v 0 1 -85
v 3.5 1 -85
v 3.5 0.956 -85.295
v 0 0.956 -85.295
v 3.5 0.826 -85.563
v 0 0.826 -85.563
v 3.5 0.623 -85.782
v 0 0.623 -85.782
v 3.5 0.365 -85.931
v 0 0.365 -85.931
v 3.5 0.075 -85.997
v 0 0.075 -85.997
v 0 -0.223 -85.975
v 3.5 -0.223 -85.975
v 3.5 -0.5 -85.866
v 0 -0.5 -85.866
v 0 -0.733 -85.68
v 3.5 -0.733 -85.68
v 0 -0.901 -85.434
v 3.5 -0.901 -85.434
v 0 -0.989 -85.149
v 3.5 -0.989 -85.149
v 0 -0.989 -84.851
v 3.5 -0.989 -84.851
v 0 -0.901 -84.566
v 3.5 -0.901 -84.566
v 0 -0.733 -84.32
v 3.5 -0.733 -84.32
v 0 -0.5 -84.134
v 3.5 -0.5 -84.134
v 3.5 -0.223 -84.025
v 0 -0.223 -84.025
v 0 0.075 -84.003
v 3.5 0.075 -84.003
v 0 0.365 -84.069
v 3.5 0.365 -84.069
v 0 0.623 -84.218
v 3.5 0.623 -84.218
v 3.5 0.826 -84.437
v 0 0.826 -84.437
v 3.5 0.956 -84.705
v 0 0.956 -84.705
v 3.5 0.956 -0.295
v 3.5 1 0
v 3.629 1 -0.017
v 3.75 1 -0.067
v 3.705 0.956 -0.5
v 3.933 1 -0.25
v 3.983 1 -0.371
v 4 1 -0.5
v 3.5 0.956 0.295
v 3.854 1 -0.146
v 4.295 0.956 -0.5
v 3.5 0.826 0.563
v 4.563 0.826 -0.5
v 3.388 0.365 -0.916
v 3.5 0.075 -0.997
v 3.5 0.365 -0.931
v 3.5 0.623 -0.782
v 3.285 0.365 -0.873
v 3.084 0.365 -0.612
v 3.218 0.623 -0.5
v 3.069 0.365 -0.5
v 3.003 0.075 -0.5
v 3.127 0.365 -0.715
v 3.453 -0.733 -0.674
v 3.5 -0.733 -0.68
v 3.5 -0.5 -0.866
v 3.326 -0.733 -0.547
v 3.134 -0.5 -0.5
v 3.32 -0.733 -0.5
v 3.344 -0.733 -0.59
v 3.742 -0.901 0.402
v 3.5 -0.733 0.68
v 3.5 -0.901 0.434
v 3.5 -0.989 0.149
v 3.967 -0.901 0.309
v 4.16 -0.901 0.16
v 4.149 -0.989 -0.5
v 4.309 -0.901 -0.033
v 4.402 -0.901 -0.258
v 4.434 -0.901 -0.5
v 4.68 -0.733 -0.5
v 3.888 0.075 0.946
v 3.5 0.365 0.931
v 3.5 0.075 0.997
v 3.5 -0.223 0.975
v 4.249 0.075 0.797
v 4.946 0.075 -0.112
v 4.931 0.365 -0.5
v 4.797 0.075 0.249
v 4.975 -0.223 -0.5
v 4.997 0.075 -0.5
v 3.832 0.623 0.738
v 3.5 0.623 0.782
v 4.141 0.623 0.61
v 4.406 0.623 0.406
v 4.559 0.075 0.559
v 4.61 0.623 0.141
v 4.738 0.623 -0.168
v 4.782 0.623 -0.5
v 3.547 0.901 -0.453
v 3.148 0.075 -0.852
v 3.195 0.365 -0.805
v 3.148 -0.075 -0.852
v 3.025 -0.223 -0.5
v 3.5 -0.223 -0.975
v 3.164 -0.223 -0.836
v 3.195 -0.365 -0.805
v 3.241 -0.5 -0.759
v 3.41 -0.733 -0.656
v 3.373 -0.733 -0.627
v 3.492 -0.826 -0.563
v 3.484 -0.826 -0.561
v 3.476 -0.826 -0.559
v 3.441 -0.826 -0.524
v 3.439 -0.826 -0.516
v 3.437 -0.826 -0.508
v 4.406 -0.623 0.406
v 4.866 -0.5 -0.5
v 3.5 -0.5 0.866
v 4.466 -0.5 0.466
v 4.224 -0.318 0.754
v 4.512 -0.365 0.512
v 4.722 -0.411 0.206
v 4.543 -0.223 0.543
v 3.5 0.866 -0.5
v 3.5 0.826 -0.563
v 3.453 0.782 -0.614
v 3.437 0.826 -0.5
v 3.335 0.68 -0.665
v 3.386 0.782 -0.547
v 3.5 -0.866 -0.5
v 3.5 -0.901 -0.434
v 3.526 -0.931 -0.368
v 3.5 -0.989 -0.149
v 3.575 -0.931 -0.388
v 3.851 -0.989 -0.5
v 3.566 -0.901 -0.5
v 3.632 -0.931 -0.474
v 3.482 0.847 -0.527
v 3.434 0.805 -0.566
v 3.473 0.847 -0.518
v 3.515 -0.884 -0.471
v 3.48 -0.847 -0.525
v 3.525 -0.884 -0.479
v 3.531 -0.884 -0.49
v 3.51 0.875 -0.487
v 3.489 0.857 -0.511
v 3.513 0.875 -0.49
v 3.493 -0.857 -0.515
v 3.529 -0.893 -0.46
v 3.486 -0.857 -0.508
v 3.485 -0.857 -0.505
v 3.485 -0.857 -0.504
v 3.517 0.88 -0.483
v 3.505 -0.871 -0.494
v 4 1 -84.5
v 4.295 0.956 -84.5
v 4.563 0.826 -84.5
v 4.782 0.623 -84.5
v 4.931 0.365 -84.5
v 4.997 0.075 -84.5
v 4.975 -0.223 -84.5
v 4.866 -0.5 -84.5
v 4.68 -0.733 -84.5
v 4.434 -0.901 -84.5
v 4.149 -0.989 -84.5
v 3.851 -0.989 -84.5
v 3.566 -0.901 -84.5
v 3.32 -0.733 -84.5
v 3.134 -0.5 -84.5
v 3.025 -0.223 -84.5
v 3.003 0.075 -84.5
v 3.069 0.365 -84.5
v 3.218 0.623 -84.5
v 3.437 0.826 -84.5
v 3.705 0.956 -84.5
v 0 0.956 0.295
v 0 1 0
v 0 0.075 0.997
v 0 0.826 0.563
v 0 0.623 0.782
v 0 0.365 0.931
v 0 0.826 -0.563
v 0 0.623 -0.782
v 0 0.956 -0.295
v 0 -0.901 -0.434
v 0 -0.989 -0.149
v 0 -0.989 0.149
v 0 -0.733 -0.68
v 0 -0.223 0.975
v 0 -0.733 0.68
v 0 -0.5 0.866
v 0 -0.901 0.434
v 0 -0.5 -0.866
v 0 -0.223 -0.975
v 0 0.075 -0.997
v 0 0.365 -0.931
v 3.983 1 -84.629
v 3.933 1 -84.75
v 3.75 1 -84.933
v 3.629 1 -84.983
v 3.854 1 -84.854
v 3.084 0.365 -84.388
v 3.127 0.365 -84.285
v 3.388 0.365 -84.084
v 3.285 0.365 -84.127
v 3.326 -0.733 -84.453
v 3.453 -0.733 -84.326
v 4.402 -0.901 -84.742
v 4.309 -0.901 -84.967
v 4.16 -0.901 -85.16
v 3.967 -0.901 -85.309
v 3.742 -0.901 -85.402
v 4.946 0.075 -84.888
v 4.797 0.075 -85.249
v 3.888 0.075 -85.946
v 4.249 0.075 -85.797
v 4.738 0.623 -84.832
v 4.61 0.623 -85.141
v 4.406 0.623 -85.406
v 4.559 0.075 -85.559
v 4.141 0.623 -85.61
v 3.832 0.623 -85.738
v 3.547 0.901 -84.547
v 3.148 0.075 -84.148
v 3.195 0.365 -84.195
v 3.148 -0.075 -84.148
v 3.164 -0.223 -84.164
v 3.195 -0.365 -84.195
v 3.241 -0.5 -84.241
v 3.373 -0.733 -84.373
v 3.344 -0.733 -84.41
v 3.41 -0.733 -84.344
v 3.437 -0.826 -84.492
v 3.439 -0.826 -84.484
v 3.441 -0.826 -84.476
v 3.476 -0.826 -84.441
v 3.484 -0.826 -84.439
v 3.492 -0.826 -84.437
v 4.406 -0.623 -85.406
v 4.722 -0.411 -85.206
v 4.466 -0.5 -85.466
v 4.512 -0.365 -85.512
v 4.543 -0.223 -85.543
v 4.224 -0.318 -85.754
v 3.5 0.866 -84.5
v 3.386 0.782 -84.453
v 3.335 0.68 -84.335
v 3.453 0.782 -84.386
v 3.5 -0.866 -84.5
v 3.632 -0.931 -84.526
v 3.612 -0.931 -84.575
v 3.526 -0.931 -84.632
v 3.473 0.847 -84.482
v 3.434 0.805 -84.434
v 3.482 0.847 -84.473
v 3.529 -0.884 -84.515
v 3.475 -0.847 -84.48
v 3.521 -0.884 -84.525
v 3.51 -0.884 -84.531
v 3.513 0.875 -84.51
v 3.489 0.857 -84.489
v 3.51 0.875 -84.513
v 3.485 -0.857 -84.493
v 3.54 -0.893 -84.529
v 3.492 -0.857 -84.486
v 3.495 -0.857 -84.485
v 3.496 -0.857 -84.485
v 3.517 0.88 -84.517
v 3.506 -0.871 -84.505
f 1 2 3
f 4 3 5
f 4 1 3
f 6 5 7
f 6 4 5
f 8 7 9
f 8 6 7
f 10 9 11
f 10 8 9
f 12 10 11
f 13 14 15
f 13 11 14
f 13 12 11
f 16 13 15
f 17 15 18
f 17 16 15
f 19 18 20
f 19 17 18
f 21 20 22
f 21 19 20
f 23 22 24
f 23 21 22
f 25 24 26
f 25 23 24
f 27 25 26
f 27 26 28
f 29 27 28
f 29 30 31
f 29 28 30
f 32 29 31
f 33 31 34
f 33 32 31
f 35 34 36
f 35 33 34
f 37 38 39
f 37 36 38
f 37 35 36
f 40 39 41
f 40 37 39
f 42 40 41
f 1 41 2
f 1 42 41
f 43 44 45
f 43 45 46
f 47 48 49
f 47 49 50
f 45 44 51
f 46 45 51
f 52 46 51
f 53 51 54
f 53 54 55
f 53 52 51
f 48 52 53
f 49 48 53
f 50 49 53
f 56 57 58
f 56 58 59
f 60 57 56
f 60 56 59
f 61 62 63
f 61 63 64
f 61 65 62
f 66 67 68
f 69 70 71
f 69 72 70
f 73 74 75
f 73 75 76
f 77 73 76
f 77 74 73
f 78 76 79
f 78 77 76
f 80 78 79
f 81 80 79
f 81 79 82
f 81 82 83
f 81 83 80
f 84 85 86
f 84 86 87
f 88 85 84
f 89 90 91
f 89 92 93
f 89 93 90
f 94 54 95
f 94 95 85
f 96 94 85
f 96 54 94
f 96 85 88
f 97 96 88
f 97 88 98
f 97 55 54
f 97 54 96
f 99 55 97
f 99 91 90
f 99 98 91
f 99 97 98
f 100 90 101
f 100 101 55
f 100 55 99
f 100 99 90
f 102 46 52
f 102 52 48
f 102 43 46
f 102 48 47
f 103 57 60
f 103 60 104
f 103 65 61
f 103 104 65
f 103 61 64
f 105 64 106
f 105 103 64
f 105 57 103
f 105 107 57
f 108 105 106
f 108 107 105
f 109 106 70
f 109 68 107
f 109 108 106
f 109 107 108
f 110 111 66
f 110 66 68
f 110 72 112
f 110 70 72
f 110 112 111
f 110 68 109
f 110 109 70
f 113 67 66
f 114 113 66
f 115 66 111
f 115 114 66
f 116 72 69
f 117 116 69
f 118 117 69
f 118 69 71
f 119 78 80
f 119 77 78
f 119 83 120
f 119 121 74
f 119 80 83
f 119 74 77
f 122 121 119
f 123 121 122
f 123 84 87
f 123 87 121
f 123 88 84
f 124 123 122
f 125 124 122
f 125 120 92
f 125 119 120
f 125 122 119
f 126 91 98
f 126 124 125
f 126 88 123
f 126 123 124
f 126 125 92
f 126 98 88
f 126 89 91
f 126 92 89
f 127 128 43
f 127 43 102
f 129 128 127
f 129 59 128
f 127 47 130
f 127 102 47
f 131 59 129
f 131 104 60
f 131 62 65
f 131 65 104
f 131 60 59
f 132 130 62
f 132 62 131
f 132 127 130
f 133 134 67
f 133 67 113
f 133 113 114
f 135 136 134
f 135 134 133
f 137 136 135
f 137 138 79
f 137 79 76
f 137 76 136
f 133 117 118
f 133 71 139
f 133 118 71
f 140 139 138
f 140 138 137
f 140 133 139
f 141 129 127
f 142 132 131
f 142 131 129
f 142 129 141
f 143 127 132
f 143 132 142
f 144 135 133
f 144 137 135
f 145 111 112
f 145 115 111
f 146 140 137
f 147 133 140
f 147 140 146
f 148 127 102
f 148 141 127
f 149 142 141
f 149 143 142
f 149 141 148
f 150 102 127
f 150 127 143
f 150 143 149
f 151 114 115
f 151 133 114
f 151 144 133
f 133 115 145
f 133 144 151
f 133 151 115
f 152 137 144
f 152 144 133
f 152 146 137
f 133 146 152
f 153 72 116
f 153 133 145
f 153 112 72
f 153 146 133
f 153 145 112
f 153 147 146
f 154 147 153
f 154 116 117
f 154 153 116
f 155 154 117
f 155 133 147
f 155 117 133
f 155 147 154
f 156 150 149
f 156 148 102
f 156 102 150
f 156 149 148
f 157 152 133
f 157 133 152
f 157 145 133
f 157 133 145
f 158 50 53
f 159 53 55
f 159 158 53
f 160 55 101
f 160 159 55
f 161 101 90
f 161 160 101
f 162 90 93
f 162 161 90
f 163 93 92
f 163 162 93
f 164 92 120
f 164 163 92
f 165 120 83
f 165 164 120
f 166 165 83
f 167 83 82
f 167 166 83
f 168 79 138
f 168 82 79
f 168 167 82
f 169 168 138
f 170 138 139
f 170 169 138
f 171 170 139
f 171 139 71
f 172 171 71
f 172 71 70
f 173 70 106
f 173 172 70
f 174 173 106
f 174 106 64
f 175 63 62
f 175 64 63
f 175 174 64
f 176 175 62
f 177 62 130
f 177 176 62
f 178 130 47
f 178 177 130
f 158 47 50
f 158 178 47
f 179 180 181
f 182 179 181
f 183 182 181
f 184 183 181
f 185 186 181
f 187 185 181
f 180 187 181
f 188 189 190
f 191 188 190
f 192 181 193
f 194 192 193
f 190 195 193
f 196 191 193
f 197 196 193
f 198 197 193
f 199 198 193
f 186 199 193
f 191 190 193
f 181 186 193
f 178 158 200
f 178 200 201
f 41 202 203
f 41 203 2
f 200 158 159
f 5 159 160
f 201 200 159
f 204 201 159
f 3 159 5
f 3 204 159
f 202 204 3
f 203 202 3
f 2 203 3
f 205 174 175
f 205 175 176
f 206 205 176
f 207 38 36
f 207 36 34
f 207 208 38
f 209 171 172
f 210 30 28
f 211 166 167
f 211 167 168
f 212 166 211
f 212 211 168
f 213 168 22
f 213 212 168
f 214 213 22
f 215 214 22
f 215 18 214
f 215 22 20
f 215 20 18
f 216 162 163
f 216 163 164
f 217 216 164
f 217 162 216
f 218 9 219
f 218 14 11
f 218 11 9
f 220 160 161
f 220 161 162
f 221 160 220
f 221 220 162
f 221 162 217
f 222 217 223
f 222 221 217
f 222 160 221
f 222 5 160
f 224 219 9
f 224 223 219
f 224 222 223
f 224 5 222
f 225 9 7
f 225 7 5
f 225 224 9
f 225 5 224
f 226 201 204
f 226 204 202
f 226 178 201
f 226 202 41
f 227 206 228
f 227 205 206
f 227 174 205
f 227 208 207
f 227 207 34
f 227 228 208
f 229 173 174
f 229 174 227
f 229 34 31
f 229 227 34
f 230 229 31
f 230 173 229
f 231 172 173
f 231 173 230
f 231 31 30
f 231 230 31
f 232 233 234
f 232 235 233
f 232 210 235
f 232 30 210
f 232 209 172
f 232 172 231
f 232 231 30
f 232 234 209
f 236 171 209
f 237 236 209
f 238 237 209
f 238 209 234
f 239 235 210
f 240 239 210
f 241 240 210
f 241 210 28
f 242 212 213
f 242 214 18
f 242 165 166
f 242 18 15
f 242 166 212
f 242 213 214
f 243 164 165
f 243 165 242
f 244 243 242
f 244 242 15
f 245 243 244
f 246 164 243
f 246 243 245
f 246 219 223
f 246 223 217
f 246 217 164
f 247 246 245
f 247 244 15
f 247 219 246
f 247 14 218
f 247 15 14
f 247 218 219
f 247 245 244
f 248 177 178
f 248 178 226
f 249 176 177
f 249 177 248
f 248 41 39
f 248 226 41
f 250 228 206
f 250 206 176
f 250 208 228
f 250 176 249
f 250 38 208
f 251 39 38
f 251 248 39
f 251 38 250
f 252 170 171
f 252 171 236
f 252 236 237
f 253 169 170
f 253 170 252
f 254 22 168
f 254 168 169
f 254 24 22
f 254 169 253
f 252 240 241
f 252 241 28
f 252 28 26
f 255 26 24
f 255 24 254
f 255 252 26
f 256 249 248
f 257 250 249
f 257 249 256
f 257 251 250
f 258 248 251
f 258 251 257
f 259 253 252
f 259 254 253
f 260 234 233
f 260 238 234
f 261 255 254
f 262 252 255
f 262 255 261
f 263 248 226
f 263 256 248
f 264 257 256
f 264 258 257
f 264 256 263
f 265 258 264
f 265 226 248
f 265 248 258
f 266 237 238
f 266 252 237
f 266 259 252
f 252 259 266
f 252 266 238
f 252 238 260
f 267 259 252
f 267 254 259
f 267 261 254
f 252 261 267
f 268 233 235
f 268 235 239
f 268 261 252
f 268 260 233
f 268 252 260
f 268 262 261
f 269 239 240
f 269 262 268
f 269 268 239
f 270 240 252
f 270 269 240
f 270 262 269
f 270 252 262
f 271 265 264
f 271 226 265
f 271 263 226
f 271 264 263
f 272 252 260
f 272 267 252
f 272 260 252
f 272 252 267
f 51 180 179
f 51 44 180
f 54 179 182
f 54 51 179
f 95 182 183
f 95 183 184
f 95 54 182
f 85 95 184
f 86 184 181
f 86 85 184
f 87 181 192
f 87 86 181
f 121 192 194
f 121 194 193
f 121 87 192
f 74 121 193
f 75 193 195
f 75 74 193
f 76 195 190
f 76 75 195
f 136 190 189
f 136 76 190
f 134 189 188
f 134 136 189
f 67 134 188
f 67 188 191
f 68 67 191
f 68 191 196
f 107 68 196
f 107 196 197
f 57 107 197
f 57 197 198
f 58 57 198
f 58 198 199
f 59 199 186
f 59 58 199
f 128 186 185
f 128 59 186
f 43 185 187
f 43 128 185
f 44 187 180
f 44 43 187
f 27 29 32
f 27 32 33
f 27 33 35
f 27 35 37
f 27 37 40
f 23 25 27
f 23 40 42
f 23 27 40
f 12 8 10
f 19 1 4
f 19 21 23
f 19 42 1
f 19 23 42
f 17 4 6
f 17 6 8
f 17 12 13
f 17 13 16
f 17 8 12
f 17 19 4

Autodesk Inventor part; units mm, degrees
ref_plane "YZ Plane" through (0, 0, 0) normal (1, 0, 0) x (0, 1, 0)
ref_plane "XZ Plane" through (0, 0, 0) normal (0, 1, 0) x (-1, 0, 0)
ref_plane "XY Plane" through (0, 0, 0) normal (0, 0, 1) x (1, 0, 0)
sketch "Sketch1" plane through (0, 0, 0) normal (1, 0, 0) x (0, 1, 0)
  circle A0 centre (0, 0) radius 1
  dimension "d0" = 2
sketch "Sketch2" plane through (0, 0, 0) normal (0, 1, 0) x (-1, 0, 0)
  line L0 (0, 0) -> (-3.5, 0)
  line L1 (-4, -0.5) -> (-4, -84.5)
  line L2 (-3.5, -85) -> (0, -85)
  arc A0 (-3.5, 0) -> (-4, -0.5) centre (-3.5, -0.5) ccw
  arc A1 (-4, -84.5) -> (-3.5, -85) centre (-3.5, -84.5) ccw
  point P0 (-4, 0)
  point P1 (-4, -85)
  dimension "d1" = 4
  dimension "d2" = 85
  dimension "d3" = 0.5
sweep "Sweep1" add profiles "Sketch1" path "Sketch2"
properties part number "Styrepind" material "Steel"
